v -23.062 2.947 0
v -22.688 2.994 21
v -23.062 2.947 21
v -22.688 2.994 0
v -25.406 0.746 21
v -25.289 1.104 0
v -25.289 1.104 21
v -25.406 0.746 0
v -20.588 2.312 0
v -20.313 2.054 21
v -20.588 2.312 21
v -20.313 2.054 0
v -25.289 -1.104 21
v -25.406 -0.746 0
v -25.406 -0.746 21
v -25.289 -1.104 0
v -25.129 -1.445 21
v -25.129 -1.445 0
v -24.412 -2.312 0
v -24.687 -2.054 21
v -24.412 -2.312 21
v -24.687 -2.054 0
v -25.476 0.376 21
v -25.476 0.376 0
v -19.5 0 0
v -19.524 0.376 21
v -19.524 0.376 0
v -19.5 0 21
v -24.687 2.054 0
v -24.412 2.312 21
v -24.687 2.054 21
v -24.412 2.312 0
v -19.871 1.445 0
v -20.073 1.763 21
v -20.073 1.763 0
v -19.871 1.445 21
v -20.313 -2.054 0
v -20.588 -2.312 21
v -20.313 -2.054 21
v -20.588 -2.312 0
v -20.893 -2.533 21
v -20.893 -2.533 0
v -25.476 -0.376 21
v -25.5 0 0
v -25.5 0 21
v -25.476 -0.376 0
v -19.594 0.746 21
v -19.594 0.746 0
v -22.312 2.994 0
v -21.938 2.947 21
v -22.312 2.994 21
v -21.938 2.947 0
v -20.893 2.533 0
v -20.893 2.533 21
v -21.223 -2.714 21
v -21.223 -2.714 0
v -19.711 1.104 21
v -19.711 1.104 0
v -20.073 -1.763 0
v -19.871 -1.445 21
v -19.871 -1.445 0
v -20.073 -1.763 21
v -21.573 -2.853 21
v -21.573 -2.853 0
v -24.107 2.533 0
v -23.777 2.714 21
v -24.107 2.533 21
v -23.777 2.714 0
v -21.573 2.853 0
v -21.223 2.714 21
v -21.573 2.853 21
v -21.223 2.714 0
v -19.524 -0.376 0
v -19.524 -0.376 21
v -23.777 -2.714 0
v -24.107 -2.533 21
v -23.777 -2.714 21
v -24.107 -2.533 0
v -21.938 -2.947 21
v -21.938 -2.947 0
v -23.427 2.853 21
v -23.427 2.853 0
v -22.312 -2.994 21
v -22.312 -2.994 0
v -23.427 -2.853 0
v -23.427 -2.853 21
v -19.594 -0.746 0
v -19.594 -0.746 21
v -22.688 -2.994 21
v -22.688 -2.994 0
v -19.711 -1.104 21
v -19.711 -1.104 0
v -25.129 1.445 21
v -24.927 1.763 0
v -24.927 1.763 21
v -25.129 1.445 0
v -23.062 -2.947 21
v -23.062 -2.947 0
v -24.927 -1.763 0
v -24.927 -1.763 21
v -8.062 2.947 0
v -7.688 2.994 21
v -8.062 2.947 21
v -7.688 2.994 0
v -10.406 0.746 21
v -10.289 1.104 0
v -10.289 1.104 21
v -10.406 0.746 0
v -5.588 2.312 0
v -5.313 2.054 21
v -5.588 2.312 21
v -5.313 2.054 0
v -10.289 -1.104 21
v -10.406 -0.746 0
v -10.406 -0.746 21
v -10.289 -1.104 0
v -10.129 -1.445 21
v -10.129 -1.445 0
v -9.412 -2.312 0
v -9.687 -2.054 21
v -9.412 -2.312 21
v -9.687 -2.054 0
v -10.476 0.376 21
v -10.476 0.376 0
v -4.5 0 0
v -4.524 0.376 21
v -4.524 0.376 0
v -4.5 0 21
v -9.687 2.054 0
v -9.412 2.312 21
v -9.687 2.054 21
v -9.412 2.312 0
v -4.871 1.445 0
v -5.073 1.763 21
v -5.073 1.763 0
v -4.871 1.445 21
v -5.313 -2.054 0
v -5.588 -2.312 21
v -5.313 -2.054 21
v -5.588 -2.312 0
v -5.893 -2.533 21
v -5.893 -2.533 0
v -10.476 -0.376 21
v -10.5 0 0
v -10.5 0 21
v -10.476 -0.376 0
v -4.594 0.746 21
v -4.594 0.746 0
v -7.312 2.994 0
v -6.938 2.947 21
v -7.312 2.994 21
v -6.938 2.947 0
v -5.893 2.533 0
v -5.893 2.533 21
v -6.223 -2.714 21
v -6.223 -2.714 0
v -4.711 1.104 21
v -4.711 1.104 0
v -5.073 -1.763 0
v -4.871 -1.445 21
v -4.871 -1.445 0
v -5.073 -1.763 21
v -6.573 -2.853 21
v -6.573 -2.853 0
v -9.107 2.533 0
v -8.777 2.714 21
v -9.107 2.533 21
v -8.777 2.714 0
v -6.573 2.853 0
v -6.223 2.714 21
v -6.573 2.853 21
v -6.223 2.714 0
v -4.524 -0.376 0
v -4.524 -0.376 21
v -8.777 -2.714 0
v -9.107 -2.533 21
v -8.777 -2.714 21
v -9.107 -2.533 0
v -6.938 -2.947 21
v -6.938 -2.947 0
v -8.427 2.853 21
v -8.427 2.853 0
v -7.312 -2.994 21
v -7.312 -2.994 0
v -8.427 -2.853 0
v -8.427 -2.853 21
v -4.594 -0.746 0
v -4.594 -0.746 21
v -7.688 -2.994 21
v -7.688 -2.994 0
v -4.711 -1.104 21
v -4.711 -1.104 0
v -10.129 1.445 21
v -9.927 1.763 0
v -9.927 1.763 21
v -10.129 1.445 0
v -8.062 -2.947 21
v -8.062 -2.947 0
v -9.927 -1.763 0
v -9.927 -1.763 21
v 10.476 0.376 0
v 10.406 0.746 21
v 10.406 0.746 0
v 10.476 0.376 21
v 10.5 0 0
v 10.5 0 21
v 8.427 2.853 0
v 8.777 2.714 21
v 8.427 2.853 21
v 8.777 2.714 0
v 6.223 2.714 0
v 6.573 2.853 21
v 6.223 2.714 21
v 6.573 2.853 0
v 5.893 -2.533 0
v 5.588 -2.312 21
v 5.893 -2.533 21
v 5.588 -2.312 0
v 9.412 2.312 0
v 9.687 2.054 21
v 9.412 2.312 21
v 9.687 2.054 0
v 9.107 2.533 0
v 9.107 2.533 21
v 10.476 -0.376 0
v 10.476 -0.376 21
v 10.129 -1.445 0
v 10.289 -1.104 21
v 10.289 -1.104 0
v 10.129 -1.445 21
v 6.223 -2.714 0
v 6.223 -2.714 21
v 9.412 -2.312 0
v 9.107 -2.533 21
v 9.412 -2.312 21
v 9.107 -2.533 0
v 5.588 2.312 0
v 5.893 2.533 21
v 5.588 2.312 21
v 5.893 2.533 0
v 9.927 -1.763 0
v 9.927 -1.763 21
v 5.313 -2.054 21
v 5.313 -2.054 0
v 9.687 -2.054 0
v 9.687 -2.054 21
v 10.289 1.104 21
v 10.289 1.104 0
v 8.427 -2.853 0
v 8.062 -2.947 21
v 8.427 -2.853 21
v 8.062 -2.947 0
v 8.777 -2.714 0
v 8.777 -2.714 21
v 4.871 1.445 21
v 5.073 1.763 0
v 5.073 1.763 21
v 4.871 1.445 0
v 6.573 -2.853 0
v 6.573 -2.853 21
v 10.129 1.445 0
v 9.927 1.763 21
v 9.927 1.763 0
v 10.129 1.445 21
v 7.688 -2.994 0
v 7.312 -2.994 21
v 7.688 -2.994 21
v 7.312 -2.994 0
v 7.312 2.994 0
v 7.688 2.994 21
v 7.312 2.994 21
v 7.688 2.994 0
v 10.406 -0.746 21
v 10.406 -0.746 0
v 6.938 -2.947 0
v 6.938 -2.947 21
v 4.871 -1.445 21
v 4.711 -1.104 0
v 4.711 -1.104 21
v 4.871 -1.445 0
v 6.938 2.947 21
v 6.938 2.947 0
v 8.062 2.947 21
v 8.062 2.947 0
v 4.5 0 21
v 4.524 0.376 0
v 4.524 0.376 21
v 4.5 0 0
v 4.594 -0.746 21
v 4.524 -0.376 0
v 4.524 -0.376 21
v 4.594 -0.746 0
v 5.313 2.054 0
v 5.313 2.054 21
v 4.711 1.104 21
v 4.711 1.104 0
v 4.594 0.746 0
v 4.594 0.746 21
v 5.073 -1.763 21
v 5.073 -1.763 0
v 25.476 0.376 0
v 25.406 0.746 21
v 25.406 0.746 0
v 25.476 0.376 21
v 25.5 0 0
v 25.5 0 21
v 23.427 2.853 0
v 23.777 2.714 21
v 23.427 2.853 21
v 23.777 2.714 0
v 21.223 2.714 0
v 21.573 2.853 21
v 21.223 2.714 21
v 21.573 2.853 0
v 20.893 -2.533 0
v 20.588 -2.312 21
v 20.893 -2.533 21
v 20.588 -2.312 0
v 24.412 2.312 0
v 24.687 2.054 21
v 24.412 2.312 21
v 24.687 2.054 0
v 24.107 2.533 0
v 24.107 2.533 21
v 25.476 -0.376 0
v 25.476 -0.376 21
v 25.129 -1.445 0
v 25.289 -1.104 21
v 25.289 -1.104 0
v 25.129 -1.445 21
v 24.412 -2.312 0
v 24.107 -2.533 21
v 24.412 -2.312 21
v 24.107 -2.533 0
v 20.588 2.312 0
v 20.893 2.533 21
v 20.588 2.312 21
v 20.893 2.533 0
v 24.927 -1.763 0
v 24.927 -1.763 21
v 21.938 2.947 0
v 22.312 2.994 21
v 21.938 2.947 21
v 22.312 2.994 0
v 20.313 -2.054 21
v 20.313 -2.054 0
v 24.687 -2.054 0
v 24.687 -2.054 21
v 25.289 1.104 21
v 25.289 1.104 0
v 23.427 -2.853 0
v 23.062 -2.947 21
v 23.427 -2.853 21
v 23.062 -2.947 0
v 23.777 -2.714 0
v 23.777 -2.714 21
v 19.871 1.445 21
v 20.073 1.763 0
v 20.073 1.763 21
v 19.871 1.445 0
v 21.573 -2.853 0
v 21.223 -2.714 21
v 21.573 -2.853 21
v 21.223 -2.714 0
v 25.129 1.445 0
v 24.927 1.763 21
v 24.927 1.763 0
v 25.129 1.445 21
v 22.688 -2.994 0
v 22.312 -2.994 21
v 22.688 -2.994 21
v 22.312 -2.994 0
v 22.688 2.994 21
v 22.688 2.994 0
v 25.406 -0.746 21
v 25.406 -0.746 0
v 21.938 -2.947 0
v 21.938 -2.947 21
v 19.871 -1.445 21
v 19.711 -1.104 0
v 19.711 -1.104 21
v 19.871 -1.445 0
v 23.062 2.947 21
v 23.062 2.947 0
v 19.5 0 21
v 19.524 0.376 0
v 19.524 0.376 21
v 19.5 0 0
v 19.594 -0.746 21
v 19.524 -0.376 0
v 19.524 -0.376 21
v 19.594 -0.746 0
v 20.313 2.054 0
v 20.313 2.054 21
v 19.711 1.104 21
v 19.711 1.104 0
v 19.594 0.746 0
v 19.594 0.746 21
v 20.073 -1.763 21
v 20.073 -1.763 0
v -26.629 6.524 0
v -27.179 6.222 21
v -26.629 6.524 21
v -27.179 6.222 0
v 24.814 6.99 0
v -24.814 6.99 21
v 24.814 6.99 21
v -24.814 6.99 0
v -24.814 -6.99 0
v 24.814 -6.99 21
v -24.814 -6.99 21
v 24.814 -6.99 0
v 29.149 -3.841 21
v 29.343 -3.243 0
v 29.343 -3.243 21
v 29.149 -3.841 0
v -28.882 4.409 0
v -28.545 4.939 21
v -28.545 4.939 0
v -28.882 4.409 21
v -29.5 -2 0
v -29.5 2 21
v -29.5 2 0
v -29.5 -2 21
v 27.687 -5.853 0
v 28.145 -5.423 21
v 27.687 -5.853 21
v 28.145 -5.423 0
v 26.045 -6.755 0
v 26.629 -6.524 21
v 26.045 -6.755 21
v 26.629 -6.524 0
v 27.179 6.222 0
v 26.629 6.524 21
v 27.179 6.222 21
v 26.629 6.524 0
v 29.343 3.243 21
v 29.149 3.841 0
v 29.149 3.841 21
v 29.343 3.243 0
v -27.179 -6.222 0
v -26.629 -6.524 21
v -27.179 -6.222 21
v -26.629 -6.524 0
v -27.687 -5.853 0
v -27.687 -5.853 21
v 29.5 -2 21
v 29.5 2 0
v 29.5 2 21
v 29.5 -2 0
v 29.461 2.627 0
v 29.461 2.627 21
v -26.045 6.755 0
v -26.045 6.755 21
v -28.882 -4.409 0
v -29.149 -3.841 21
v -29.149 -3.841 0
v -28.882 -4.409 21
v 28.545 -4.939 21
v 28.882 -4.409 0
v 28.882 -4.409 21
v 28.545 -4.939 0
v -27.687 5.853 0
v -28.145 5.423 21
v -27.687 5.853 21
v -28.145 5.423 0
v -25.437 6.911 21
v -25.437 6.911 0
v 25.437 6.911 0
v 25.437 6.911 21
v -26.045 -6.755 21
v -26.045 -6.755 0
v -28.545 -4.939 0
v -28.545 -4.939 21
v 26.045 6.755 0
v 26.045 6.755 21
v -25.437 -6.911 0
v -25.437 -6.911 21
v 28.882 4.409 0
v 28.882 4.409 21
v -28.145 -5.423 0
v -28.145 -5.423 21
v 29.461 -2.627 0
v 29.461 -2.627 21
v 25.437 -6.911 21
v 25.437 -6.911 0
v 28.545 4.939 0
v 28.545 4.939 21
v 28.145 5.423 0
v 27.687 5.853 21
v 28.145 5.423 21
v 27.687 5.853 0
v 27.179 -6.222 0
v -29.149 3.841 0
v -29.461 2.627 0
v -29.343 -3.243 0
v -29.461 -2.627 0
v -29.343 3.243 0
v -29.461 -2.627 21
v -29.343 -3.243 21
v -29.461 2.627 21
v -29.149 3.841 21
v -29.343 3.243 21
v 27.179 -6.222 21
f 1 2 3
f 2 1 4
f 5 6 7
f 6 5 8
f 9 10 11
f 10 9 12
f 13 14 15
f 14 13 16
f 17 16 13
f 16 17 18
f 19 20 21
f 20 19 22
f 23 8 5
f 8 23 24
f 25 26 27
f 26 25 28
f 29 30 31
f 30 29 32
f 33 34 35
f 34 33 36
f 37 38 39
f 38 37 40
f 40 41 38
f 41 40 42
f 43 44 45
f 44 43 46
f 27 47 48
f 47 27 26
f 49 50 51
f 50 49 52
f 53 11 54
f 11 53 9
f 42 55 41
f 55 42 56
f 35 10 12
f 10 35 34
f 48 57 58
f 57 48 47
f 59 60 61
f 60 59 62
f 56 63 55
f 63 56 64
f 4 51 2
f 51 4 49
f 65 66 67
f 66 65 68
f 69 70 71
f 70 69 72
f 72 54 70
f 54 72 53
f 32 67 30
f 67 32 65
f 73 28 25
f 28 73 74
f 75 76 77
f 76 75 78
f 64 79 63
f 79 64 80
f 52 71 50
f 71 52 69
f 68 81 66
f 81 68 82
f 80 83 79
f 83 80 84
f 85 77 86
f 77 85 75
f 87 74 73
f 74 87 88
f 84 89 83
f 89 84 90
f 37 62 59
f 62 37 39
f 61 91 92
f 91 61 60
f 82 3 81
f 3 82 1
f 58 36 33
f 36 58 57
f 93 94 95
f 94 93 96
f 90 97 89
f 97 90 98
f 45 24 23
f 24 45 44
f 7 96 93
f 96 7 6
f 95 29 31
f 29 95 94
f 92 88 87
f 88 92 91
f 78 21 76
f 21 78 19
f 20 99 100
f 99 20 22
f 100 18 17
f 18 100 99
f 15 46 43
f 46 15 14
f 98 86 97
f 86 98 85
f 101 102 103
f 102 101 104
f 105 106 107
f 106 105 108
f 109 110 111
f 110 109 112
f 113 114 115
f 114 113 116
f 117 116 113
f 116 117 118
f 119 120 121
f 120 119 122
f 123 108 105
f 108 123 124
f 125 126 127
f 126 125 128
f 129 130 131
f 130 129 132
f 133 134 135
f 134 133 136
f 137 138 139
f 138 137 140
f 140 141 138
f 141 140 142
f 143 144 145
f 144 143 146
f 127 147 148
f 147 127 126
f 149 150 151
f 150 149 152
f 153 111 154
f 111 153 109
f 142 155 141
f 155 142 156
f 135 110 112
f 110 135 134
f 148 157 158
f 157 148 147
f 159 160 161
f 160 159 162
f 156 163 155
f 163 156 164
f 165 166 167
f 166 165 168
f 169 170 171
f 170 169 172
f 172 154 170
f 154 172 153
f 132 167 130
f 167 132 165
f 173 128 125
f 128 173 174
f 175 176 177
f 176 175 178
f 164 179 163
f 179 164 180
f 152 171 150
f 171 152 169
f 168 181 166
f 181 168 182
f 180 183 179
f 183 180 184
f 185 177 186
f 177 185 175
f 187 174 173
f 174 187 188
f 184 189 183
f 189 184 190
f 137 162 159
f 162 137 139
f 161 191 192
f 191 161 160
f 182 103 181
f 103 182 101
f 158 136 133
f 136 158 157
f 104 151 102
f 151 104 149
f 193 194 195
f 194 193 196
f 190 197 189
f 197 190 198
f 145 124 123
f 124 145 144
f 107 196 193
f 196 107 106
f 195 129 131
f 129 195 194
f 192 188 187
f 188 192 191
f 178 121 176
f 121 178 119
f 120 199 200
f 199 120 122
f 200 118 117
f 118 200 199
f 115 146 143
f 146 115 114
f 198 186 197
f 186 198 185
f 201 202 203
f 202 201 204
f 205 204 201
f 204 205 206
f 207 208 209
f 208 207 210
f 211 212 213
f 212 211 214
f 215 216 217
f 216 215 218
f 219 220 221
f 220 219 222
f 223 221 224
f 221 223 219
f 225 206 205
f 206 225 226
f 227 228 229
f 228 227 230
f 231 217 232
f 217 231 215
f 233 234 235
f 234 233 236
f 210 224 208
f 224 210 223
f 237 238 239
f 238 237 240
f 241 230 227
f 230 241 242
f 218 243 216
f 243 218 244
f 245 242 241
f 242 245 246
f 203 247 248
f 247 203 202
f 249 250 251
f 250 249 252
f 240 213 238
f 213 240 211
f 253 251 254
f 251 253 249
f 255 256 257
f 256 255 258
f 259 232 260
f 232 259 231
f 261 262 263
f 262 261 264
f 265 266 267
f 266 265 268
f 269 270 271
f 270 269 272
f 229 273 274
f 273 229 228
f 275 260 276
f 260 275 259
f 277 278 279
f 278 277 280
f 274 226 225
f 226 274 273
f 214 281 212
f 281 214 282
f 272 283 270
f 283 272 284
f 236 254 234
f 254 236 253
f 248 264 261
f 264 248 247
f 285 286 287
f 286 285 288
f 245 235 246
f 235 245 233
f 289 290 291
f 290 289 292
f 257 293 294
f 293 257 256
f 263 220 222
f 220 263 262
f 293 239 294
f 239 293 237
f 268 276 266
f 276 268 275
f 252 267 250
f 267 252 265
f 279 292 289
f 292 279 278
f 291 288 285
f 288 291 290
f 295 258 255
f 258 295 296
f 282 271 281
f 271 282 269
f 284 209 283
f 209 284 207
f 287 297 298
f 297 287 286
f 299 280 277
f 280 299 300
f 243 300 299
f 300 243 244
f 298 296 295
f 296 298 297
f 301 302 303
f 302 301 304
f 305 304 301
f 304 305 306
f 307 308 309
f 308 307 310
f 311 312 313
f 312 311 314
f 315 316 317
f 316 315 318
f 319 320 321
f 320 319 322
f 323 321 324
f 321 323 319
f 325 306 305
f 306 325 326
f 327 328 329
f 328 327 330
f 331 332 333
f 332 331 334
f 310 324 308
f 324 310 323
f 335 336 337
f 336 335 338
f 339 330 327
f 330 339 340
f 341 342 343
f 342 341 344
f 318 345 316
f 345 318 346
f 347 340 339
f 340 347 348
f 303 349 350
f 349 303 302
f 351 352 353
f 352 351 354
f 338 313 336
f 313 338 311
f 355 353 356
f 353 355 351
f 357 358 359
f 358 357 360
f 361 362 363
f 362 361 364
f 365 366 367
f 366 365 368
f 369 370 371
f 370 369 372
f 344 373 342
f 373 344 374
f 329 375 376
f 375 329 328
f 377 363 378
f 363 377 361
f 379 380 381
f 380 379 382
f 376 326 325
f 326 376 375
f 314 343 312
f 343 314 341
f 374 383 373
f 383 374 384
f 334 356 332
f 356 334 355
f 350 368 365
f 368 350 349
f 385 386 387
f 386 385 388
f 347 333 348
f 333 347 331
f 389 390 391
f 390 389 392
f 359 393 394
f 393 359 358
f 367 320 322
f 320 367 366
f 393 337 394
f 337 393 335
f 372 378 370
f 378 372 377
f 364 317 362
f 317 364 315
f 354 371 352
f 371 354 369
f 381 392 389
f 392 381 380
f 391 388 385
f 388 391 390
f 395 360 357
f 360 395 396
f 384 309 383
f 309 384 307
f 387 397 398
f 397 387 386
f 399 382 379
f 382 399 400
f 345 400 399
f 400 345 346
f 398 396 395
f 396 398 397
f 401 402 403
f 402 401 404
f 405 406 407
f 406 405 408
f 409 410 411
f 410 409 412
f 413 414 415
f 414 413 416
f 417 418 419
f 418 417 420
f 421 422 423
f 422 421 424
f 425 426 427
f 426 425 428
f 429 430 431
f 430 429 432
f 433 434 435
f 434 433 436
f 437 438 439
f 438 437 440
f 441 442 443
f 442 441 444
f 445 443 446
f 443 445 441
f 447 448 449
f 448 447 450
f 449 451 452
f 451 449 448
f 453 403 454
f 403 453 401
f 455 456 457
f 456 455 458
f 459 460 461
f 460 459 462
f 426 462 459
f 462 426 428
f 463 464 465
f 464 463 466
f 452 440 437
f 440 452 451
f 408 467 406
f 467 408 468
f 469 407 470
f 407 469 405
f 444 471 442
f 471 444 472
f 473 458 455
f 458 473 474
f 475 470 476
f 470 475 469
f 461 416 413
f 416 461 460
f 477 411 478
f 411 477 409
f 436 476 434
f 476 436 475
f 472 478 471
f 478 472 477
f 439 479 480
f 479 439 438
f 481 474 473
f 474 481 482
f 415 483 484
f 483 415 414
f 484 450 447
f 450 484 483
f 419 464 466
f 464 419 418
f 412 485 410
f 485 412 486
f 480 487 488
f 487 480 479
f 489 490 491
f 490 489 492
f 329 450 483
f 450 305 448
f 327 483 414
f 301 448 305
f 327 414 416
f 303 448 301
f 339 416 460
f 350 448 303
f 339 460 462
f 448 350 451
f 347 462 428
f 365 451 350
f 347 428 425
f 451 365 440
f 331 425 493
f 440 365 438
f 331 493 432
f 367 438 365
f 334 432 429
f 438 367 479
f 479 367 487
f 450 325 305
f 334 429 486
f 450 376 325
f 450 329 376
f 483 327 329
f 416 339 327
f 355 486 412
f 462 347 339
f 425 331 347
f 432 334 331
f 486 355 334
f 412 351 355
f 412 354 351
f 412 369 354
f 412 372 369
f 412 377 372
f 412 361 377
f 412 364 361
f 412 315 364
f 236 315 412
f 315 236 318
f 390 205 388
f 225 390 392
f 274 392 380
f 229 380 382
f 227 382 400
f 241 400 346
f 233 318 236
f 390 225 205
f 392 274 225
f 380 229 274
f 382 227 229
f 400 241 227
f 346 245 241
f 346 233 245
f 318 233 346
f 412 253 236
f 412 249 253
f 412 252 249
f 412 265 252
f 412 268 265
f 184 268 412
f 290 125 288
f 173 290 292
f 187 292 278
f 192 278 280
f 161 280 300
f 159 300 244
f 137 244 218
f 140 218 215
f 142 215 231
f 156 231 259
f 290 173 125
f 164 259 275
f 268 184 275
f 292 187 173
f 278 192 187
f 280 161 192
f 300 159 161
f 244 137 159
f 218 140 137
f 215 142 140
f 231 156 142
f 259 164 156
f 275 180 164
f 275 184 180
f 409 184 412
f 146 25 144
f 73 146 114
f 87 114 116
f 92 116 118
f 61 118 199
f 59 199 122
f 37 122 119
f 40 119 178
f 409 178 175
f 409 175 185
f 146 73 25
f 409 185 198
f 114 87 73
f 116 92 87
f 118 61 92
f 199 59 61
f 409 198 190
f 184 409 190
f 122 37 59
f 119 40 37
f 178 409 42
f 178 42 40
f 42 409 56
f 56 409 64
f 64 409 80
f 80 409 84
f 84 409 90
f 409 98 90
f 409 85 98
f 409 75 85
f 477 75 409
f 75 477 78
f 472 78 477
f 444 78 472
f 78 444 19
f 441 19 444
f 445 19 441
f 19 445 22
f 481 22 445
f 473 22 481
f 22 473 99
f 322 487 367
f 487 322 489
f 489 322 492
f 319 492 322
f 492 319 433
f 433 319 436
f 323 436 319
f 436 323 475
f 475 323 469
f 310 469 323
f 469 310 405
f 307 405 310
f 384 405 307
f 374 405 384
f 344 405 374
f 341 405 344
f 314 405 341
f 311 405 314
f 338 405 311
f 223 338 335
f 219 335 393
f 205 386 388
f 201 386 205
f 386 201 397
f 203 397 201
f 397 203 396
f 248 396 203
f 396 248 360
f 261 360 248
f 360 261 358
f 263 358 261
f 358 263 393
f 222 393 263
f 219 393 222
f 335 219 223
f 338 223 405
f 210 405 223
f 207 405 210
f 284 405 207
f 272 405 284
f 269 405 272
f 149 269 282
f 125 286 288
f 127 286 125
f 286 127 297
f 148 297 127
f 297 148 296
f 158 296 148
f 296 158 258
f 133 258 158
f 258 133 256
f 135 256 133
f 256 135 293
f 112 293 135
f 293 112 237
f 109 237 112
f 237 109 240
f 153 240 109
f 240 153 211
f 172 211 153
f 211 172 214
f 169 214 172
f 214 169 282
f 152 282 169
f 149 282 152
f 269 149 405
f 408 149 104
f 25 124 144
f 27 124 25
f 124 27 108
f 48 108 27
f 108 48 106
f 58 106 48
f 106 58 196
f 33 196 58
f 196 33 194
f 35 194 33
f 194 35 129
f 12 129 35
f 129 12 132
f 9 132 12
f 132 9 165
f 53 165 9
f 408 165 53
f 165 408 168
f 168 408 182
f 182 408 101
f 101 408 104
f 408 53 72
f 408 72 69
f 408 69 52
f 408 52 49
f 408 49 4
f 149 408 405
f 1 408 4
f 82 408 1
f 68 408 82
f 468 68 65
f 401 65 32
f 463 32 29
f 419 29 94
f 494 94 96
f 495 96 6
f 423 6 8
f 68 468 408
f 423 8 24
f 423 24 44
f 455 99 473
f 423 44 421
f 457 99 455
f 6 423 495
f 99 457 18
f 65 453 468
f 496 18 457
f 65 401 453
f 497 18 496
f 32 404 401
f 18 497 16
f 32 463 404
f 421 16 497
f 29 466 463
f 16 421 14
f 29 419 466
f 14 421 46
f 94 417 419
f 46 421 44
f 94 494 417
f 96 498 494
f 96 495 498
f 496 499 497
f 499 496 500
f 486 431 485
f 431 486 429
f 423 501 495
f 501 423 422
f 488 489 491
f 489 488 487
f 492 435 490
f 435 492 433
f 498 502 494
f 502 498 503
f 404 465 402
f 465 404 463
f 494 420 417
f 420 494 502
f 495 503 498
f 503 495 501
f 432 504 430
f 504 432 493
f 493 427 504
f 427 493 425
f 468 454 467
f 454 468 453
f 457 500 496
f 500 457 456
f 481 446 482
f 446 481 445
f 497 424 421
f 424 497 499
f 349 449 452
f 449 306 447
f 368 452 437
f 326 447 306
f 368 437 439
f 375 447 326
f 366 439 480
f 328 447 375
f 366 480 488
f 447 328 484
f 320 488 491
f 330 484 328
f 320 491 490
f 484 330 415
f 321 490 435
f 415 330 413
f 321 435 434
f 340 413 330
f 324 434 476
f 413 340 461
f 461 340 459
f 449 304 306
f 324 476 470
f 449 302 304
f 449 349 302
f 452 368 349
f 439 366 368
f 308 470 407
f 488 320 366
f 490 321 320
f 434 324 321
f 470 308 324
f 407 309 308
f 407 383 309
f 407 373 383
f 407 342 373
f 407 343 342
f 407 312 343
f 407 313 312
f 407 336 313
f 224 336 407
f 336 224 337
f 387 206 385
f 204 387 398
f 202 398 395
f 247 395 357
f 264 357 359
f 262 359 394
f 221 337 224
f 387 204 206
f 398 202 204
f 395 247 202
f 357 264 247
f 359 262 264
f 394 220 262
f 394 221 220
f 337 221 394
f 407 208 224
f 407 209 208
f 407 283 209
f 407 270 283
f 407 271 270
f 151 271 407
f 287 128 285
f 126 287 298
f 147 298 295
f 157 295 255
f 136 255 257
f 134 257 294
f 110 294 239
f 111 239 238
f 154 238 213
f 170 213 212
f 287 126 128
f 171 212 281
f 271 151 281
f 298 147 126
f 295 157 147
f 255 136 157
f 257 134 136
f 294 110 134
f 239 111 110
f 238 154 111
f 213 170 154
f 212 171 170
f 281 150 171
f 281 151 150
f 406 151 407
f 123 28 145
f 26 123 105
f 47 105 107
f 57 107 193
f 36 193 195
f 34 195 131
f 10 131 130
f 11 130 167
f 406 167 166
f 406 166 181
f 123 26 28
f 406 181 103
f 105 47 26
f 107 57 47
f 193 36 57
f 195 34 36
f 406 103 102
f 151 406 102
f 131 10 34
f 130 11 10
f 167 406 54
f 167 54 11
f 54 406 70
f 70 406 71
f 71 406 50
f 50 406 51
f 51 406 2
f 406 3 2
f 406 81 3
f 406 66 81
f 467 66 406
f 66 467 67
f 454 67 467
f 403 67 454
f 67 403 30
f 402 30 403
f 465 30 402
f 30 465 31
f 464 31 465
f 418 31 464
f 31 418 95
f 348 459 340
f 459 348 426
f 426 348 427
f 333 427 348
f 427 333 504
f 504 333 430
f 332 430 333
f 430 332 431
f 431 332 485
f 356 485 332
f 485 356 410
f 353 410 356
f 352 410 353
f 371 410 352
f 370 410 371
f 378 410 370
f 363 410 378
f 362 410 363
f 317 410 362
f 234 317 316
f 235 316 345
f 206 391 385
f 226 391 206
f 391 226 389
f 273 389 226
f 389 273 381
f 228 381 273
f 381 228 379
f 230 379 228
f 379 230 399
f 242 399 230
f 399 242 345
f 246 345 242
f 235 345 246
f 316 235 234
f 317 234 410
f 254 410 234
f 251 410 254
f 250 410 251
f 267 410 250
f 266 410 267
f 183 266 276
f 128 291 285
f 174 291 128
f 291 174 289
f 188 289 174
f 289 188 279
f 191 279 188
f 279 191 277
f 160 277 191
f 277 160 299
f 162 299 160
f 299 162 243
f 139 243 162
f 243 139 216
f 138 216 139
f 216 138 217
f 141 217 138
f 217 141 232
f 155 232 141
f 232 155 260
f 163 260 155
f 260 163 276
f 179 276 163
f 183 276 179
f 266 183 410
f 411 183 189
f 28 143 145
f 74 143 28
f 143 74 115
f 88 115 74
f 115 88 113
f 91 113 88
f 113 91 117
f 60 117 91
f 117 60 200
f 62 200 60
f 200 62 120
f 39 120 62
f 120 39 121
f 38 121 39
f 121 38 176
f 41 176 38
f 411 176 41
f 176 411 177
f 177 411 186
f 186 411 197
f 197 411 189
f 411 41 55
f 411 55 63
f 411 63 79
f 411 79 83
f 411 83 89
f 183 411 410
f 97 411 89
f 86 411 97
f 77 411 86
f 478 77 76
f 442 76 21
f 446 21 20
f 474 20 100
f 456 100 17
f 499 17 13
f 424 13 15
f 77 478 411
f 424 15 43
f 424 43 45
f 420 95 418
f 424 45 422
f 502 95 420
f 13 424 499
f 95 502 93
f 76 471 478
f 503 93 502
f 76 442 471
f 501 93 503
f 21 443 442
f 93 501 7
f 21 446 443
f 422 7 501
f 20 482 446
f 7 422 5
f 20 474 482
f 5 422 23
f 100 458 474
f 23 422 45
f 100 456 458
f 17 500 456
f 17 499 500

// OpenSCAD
$fn = 50;


difference() {
	union() {
		hull() {
			translate(v = [-24.5000000000, 2.0000000000, 0]) {
				cylinder(h = 21, r = 5);
			}
			translate(v = [24.5000000000, 2.0000000000, 0]) {
				cylinder(h = 21, r = 5);
			}
			translate(v = [-24.5000000000, -2.0000000000, 0]) {
				cylinder(h = 21, r = 5);
			}
			translate(v = [24.5000000000, -2.0000000000, 0]) {
				cylinder(h = 21, r = 5);
			}
		}
	}
	union() {
		translate(v = [-22.5000000000, 0.0000000000, 0]) {
			translate(v = [0, 0, -100]) {
				cylinder(h = 200, r = 3.0000000000);
			}
		}
		translate(v = [-7.5000000000, 0.0000000000, 0]) {
			translate(v = [0, 0, -100]) {
				cylinder(h = 200, r = 3.0000000000);
			}
		}
		translate(v = [7.5000000000, 0.0000000000, 0]) {
			translate(v = [0, 0, -100]) {
				cylinder(h = 200, r = 3.0000000000);
			}
		}
		translate(v = [22.5000000000, 0.0000000000, 0]) {
			translate(v = [0, 0, -100]) {
				cylinder(h = 200, r = 3.0000000000);
			}
		}
	}
}
